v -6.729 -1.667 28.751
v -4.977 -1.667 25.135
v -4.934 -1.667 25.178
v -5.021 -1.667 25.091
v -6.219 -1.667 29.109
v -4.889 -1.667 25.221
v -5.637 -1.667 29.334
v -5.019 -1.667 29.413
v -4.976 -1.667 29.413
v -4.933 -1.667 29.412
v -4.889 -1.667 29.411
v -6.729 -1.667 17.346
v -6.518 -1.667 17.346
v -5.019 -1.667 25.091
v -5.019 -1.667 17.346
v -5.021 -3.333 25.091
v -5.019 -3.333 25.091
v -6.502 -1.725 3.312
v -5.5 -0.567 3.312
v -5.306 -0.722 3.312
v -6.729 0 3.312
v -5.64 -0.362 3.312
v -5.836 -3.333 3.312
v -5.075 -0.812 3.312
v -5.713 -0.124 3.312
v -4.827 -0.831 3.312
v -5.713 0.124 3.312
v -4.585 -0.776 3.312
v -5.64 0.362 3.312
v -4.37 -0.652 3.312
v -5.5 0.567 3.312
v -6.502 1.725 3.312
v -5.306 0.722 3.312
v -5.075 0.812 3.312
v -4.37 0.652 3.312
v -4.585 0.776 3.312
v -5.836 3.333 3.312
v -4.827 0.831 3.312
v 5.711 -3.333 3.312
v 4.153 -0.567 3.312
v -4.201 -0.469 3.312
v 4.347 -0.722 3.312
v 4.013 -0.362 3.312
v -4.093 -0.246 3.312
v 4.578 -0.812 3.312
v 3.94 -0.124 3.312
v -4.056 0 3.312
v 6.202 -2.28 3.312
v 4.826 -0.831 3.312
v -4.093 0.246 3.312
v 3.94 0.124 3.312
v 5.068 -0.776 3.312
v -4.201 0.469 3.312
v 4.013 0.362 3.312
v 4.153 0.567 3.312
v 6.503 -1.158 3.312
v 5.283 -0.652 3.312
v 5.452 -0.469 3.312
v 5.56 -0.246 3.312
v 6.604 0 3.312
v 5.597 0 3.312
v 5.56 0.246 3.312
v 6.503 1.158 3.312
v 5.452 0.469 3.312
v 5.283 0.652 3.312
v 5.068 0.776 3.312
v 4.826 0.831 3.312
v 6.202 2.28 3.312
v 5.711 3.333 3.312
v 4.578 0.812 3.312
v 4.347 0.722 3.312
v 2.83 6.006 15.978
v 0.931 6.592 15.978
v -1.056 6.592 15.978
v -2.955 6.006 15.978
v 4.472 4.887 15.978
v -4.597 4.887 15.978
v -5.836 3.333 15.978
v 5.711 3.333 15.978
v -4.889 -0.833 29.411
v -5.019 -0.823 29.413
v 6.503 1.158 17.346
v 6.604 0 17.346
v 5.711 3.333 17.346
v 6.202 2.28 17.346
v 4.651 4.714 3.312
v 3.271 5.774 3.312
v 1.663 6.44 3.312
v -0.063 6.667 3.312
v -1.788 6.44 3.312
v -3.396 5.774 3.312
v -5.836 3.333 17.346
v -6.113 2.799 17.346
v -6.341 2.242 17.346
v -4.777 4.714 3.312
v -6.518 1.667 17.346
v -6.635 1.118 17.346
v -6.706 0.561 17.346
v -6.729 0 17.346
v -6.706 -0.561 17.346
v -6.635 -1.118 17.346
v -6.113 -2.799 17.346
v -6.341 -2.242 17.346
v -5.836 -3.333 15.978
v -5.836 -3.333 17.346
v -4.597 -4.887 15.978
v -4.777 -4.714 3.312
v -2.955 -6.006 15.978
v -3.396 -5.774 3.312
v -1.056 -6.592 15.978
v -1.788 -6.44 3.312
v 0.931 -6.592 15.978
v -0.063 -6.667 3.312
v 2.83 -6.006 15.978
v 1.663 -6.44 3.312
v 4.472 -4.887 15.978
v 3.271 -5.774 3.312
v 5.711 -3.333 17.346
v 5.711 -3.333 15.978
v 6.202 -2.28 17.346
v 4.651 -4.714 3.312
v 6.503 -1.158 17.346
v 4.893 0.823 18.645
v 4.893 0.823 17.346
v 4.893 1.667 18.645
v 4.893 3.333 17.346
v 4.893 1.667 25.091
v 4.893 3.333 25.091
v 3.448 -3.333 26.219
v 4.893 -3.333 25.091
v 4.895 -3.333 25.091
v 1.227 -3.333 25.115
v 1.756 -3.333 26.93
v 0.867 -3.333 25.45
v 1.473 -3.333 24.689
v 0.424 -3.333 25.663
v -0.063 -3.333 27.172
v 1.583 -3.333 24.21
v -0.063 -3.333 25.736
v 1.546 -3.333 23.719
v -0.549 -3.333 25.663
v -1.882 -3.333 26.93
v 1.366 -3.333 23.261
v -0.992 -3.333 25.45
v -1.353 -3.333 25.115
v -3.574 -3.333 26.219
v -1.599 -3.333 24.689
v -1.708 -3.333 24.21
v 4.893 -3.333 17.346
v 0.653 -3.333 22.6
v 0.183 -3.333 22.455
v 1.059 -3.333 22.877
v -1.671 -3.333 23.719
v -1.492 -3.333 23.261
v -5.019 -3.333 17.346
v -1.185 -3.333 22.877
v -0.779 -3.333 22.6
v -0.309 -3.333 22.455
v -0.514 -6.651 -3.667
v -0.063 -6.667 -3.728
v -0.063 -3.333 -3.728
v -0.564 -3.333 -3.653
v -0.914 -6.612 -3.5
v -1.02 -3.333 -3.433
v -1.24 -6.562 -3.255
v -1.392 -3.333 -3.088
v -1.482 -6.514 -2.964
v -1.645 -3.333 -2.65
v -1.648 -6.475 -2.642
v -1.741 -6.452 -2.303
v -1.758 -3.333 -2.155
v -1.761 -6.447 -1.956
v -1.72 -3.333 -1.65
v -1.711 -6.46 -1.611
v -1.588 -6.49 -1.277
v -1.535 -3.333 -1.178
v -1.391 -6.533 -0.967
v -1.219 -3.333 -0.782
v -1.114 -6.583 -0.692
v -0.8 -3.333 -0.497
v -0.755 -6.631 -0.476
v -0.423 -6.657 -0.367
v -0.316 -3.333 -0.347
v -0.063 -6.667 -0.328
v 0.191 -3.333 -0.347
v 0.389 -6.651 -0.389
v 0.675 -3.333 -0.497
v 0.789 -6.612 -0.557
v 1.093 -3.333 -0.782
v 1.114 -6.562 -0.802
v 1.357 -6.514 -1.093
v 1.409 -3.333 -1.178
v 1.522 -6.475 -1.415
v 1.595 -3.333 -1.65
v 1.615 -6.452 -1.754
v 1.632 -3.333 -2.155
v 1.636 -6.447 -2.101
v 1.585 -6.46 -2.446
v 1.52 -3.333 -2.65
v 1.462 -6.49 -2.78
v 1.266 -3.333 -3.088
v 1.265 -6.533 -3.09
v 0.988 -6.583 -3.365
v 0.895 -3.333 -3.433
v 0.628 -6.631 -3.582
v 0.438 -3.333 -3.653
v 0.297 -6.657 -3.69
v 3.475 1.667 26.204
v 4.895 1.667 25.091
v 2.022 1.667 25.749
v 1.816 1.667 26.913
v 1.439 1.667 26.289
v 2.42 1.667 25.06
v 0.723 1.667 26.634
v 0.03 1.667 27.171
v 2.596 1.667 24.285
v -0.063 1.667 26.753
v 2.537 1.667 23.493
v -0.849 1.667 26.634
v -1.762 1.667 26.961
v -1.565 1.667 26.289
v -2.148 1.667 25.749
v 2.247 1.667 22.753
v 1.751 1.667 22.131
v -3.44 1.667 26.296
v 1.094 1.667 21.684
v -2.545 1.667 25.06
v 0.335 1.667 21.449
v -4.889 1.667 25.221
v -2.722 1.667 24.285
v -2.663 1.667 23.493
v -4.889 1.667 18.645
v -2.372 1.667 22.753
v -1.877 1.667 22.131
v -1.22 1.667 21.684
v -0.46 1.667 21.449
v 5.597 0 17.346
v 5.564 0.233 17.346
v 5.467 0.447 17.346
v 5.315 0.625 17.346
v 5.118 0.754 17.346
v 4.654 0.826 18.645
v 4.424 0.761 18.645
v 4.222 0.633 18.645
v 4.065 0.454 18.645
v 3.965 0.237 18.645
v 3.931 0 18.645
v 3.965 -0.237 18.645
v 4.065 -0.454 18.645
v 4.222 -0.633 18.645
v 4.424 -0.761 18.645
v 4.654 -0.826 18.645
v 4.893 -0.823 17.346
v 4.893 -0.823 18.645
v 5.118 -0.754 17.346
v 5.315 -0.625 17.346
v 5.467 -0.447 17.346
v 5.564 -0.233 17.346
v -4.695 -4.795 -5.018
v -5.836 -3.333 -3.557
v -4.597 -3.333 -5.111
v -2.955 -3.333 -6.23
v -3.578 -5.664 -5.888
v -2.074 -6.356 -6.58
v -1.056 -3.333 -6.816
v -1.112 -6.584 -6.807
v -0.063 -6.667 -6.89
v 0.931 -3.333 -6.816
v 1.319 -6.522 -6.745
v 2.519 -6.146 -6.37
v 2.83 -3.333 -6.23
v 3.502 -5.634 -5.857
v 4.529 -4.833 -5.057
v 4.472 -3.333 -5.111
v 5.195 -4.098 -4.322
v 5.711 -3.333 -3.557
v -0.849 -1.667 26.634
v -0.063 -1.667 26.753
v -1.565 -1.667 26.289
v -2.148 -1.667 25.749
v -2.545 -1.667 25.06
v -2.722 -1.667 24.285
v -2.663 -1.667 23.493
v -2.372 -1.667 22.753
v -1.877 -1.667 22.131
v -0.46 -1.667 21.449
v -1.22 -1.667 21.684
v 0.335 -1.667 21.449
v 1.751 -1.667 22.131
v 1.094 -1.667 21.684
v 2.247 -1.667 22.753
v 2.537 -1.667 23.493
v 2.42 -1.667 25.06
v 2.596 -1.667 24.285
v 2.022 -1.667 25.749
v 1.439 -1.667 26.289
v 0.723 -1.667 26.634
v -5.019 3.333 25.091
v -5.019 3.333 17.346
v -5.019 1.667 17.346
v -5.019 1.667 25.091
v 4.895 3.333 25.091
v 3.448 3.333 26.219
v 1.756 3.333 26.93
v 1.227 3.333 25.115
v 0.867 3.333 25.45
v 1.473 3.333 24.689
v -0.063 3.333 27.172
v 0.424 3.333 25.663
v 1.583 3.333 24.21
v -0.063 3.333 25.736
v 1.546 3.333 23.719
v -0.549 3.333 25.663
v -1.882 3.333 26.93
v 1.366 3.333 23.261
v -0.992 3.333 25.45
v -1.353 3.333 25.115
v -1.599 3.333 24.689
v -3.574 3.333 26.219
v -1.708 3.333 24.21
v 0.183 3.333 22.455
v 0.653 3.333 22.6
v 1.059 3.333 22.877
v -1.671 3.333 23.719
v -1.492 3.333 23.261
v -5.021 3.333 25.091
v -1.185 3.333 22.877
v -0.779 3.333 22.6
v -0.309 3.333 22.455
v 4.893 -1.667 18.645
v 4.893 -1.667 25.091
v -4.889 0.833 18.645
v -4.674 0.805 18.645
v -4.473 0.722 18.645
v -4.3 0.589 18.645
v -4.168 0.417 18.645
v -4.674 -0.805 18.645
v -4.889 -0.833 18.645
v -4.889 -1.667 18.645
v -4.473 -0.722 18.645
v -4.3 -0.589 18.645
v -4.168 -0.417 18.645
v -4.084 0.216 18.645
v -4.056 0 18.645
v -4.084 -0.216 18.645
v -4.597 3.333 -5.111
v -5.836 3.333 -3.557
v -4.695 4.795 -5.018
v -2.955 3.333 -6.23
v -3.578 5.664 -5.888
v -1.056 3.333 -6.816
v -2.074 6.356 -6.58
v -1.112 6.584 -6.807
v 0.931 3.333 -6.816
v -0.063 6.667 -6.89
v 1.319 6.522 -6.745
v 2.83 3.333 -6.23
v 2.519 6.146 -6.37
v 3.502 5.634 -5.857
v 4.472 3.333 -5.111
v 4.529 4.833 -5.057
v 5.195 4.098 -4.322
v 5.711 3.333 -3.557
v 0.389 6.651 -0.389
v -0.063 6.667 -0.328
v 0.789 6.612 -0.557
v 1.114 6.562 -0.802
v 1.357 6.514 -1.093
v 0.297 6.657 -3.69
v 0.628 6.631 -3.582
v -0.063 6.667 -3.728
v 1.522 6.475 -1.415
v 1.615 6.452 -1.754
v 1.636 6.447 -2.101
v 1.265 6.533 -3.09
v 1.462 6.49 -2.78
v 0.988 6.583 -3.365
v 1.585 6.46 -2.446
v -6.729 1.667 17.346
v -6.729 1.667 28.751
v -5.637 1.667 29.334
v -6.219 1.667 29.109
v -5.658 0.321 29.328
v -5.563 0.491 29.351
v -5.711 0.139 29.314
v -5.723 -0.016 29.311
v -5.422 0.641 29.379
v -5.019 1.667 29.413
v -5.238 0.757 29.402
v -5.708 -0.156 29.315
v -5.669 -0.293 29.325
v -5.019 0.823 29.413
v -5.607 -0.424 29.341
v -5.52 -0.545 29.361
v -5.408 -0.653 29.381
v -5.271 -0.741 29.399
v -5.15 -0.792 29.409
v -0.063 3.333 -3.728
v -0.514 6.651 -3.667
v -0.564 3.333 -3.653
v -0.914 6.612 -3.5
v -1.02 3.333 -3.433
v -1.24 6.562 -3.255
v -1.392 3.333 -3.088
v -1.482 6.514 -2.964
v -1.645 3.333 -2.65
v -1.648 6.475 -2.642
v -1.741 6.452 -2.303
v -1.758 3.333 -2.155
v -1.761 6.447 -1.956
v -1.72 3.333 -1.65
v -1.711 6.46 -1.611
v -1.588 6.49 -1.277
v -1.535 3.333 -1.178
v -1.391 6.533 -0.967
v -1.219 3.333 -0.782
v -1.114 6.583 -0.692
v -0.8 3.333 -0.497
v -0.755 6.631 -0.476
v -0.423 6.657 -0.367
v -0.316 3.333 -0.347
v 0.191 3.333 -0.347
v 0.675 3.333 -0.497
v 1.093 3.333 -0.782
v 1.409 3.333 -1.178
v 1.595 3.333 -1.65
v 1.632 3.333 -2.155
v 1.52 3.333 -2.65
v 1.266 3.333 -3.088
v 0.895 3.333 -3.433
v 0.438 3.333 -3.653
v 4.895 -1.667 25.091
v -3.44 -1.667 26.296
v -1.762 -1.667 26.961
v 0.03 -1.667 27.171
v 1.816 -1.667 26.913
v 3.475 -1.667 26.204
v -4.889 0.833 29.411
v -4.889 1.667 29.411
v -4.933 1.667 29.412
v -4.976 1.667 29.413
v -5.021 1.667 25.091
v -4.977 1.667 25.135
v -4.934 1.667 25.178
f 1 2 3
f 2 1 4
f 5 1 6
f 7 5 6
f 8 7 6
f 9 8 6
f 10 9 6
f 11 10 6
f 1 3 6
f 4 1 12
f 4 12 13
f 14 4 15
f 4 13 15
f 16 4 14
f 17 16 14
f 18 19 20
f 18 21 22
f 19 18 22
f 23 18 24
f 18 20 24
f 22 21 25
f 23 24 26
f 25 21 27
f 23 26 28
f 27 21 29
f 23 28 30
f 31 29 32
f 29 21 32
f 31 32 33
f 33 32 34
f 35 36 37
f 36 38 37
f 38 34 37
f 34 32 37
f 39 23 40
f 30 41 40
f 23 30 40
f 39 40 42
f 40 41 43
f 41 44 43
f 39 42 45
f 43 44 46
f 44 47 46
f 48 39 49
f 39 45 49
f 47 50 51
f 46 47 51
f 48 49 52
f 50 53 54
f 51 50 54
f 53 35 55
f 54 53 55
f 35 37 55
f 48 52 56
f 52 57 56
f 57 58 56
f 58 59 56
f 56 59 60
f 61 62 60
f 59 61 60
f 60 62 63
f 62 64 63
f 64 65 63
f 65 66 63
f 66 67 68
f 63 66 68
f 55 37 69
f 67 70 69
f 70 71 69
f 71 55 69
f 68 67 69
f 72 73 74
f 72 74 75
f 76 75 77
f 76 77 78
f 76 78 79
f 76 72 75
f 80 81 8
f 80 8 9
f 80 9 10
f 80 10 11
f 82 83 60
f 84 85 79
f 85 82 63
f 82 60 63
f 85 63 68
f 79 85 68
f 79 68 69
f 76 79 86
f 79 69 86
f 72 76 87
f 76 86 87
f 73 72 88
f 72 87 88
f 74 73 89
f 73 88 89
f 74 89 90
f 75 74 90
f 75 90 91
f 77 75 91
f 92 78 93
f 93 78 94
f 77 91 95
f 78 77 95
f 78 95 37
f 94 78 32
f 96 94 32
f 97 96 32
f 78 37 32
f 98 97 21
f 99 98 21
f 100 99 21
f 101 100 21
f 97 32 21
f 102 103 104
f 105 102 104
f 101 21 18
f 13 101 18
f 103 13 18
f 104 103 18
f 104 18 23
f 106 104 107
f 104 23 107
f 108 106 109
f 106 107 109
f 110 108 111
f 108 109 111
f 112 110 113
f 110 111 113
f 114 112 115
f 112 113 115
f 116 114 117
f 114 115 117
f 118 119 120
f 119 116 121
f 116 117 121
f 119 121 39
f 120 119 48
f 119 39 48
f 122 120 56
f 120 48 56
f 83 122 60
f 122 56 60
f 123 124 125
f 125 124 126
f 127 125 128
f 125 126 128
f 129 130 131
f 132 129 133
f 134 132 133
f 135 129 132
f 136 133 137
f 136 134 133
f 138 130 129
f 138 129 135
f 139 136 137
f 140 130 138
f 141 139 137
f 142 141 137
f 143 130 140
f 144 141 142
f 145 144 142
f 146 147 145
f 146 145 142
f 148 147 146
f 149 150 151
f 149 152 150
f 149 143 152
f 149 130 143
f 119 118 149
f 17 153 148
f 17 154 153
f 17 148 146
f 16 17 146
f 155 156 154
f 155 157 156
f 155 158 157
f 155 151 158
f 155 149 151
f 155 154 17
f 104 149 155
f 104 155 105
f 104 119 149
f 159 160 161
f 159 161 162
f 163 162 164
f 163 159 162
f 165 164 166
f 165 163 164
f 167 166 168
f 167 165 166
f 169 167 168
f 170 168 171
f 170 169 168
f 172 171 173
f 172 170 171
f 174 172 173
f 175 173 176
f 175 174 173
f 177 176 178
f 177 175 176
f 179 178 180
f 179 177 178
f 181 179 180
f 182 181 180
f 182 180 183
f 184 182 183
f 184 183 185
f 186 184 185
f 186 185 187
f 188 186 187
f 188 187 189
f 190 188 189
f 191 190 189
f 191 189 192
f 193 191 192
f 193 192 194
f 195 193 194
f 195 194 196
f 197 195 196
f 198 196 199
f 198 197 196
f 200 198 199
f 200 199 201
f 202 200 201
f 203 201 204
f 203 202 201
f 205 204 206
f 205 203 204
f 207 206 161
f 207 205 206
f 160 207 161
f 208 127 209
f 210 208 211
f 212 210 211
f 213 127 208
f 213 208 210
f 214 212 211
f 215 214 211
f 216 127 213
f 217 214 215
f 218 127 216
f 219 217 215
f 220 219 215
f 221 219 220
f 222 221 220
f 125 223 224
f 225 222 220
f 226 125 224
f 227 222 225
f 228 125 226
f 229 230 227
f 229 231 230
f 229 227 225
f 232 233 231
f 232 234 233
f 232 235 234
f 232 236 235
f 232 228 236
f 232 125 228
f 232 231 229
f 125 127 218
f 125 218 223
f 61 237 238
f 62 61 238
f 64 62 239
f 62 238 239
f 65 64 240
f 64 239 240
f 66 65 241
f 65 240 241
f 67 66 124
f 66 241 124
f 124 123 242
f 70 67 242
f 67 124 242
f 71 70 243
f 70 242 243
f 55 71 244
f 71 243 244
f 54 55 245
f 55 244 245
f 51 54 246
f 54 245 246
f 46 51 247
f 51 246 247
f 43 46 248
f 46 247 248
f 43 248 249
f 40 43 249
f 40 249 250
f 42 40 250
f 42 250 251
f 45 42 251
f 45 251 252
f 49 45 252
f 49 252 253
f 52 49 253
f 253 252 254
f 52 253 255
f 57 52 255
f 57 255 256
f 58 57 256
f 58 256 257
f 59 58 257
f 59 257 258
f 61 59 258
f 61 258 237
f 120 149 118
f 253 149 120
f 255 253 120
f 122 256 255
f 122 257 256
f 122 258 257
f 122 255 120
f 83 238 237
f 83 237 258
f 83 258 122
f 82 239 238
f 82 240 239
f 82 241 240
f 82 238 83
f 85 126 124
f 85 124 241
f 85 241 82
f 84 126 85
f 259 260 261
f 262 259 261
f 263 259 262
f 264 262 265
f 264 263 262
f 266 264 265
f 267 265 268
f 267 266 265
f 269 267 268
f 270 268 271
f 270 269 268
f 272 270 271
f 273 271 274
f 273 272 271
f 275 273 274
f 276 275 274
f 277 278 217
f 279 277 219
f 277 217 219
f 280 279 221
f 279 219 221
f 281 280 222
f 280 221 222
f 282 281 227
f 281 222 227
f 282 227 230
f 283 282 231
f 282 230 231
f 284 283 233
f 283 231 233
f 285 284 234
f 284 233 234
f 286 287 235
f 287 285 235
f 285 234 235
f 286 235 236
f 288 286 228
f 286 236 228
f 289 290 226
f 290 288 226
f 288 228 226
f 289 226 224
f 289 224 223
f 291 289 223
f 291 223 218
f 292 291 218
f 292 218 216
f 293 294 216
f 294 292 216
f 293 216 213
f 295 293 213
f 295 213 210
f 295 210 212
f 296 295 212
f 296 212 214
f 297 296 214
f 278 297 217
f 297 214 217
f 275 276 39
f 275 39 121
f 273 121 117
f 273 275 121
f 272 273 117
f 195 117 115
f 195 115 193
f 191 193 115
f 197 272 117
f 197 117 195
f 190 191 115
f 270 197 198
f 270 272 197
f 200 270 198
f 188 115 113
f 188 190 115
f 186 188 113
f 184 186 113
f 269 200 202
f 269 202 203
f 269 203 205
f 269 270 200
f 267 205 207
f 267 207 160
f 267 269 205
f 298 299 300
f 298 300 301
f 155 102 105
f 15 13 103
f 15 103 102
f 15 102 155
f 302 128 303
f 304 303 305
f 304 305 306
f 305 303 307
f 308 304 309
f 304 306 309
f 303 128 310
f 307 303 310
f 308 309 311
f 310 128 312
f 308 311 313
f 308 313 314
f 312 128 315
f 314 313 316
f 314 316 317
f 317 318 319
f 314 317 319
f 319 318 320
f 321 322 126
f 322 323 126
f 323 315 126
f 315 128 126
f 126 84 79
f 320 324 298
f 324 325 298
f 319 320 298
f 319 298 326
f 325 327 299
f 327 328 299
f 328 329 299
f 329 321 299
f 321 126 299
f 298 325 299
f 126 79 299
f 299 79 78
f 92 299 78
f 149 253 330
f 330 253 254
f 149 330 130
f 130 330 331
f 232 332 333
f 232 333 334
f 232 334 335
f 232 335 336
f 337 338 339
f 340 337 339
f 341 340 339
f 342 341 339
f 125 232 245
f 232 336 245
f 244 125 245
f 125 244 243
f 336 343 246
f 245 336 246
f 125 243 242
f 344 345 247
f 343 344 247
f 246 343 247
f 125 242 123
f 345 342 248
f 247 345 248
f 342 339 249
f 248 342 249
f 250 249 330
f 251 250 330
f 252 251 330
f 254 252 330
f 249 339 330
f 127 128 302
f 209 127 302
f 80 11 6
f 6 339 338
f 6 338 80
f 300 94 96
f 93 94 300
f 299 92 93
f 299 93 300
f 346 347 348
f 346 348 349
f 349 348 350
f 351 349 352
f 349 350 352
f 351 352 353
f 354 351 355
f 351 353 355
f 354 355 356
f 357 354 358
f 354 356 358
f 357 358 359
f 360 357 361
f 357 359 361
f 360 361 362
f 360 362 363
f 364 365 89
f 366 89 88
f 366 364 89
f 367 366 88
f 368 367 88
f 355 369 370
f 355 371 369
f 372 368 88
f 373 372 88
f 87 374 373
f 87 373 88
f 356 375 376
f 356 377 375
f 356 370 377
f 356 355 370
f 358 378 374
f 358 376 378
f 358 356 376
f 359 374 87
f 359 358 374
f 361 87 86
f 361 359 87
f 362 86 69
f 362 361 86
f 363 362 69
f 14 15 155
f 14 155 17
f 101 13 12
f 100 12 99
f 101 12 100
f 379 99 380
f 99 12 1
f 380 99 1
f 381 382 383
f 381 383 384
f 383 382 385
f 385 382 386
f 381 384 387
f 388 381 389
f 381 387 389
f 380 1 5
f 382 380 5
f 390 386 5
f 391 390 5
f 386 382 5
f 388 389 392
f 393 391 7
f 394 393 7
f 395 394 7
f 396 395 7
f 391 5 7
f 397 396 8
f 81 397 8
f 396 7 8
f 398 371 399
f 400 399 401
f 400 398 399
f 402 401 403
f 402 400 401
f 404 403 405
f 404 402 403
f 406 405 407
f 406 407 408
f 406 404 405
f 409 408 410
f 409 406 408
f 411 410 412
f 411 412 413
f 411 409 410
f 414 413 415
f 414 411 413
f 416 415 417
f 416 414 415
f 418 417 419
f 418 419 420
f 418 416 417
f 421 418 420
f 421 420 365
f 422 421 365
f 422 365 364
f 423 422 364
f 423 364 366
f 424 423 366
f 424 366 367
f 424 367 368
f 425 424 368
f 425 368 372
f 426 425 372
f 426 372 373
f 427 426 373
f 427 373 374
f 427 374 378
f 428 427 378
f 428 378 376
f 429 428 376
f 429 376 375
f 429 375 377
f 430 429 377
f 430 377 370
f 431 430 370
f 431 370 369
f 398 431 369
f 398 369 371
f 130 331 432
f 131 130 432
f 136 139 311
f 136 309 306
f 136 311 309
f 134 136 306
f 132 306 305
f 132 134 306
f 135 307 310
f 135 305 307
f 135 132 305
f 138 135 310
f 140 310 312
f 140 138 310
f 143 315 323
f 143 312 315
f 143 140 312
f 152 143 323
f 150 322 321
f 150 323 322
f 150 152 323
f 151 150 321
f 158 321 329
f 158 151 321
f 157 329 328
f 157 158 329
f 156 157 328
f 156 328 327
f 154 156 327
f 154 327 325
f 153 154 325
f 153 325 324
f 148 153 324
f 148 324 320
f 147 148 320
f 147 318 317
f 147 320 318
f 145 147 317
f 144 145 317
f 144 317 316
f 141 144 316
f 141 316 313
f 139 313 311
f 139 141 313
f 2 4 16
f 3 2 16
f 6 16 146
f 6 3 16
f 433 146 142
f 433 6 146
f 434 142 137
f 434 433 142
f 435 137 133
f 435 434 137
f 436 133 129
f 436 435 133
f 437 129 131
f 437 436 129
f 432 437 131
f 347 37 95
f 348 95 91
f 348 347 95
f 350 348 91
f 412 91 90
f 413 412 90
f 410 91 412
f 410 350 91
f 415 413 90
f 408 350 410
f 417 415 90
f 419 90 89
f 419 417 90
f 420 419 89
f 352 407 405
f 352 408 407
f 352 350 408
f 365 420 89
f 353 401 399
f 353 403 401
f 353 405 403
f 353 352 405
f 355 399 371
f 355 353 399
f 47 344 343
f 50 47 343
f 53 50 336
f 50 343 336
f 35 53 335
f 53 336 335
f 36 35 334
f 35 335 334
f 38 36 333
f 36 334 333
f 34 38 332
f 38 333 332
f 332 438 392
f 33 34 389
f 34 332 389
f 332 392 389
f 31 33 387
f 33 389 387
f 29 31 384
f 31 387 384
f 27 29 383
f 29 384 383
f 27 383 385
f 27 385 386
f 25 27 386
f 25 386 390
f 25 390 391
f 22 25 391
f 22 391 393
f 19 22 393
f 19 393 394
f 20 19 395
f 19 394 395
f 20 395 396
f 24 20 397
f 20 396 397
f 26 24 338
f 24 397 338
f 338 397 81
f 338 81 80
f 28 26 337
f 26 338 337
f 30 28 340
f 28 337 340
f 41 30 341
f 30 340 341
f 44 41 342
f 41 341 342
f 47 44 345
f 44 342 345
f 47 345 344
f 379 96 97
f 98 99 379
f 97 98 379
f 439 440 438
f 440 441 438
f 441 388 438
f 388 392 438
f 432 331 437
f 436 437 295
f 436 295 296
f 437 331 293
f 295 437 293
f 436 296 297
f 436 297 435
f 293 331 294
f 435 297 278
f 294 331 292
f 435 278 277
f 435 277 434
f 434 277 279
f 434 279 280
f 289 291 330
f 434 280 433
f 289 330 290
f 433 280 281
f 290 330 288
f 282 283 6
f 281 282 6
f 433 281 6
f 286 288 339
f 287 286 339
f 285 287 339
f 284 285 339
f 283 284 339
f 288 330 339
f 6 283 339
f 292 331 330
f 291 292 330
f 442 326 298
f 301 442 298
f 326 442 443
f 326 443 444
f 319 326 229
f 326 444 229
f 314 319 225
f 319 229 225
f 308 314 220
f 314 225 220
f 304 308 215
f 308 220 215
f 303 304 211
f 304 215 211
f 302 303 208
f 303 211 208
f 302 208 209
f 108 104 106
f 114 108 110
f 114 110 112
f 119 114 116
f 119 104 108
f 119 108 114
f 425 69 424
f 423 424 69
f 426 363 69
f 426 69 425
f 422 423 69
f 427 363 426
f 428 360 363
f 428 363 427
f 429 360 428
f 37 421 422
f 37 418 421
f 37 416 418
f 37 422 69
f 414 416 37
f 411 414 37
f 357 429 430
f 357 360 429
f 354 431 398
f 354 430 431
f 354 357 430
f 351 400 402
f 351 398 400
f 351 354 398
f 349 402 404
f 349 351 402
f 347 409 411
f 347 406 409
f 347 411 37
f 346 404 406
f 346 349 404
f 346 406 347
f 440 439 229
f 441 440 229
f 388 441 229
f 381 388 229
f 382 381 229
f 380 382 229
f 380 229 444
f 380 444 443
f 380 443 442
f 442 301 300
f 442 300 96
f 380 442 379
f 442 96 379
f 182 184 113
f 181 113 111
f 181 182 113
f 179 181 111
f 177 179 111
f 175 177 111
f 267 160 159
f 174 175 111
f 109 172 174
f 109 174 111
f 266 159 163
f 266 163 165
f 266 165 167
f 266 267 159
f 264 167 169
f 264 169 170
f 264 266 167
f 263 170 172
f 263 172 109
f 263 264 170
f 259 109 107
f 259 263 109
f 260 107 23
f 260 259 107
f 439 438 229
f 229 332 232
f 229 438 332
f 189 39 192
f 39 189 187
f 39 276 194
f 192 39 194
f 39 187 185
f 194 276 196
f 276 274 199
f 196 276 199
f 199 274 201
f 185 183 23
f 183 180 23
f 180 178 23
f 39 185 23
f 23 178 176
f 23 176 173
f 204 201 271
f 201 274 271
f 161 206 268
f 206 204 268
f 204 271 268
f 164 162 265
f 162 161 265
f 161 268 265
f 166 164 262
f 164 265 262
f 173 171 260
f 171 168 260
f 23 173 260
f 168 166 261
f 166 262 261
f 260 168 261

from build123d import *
from build123d.topology import SkipClean

# Parameters (mm, degrees)
SKETCH2_R                       = 10
PHALANGE_LENGTH_DEPTH           = 23
BOSS_EXTRUDE3_DEPTH             = 5
BOSS_EXTRUDE4_DEPTH             = 5
BOSS_EXTRUDE4_DEPTH_BACK        = 5
CUT_EXTRUDE2_START              = -15.3025
CUT_EXTRUDE2_DEPTH              = 15.3025
SKETCH7_R                       = 1.65
CUT_EXTRUDE3_DEPTH              = 10
CUT_EXTRUDE4_DEPTH              = 2.5
CUT_EXTRUDE4_DEPTH_BACK         = 2.5
CUT_EXTRUDE7_REACH              = 44.378
SKETCH4_R                       = 1.65
CUT_EXTRUDE7_DIRECTION_2_REACH  = 44.378
CUT_EXTRUDE_THIN1_START         = 23
CUT_EXTRUDE_THIN1_DEPTH         = 10.361670454
BOSS_EXTRUDE5_REACH             = 43.559
SKETCH9_R                       = 4
SKETCH9_R_2                     = 1.65
CUT_EXTRUDE8_REACH              = 42.83
SKETCH10_R                      = 1.25
CUT_EXTRUDE9_START              = -4
CUT_EXTRUDE9_DEPTH              = 4
CUT_EXTRUDE10_REACH             = 43.559
CUT_EXTRUDE10_DIRECTION_2_REACH = 43.559
CUT_EXTRUDE11_START             = -10
CUT_EXTRUDE11_OUTLINE_W         = 2.565773848
CUT_EXTRUDE11_OUTLINE_H         = 11.6166929
CUT_EXTRUDE11_DEPTH             = 10
BOSS_EXTRUDE7_REACH             = 41.207
CUT_EXTRUDE12_REACH             = 42.83
SKETCH10_2_R                    = 1.25
CUT_EXTRUDE12_DIRECTION_2_REACH = 42.83
SKETCH17_R                      = 1.25
SKETCH17_W                      = 2.42123439
SKETCH17_H                      = 5
CUT_EXTRUDE14_DEPTH             = 16.148519
SCALE1_SCALE                    = 0.666666667
CUT_EXTRUDE15_START             = -10
SKETCH18_R                      = 1.65
CUT_EXTRUDE15_DEPTH             = 13.333338
CUT_EXTRUDE16_START             = -3.333333
SKETCH19_R                      = 1.7
CUT_EXTRUDE16_DEPTH             = 13.333338


# Read off the part's stored shape, not the designer's step: Cut-Extrude-Thin1, Cut-Extrude11
with BuildPart() as part:
    # Sketch2 → Phalange Length (new body)
    with BuildSketch(Plane.XY):
        Circle(SKETCH2_R)
    extrude(amount=PHALANGE_LENGTH_DEPTH)

    # Sketch3 → Boss-Extrude3 (add)
    with BuildSketch(Plane(origin=(0, -10, 0), x_dir=(-1, 0, 0), z_dir=(0, -1, 0))):
        with BuildLine():
            Line((-10, 5.302499701), (-10, 0))
            Line((-10, 0), (10, 0))
            Line((10, 0), (10, 5.302499701))
            ThreePointArc((10, 5.302499701), (0, 15.302499701), (-10, 5.302499701))
        make_face()
    boss_extrude3 = extrude(amount=-BOSS_EXTRUDE3_DEPTH)

    # Mirror1: Boss-Extrude3 across plane
    add(boss_extrude3.mirror(Plane.ZX))

    # Sketch5 → Boss-Extrude4 (add, two sides: drawn at the far end of the back side and taken through both)
    with BuildSketch(Plane(origin=(0, 0, 0), x_dir=(1, 0, 0), z_dir=(0, 1, 0)).offset(-BOSS_EXTRUDE4_DEPTH_BACK)):
        with BuildLine():
            Line((-10, -28.783157911), (-10, -23))
            Line((-10, -23), (10, -23))
            Line((10, -23), (10, -28.783157911))
            ThreePointArc((10, -28.783157911), (0, -38.351984156), (-10, -28.783157911))
        make_face()
    extrude(amount=BOSS_EXTRUDE4_DEPTH + BOSS_EXTRUDE4_DEPTH_BACK)

    # Sketch6 → Cut-Extrude2 (cut)
    with SkipClean():  # the faces are left unmerged after this step: merging them gives an invalid solid
        with BuildSketch(Plane.XY.offset(CUT_EXTRUDE2_START)):
            with BuildLine():
                ThreePointArc((0, 10), (5, 8.660254038), (8.660254038, 5))
                Line((8.660254038, 5), (10, 5))
                Line((10, 5), (10, 10))
                Line((10, 10), (0, 10))
            make_face()
            with BuildLine():
                Line((10, -5), (8.660254038, -5))
                ThreePointArc((8.660254038, -5), (5, -8.660254038), (0, -10))
                Line((0, -10), (10, -10))
                Line((10, -10), (10, -5))
            make_face()
            with BuildLine():
                ThreePointArc((-8.660254038, 5), (-5, 8.660254038), (0, 10))
                Line((0, 10), (-10, 10))
                Line((-10, 10), (-10, 5))
                Line((-10, 5), (-8.660254038, 5))
            make_face()
            with BuildLine():
                Line((-10, -10), (0, -10))
                ThreePointArc((0, -10), (-5, -8.660254038), (-8.660254038, -5))
                Line((-8.660254038, -5), (-10, -5))
                Line((-10, -5), (-10, -10))
            make_face()
        extrude(amount=CUT_EXTRUDE2_DEPTH, mode=Mode.SUBTRACT)

    # Sketch7 → Cut-Extrude3 (cut)
    with SkipClean():  # the faces are left unmerged after this step: merging them gives an invalid solid
        with BuildSketch(Plane(origin=(0, 5, 0), x_dir=(1, 0, 0), z_dir=(0, 1, 0))):
            with Locations(Location((0, -31.161984156, 0), (0, 0, 270))):
                Circle(SKETCH7_R)
        extrude(amount=-CUT_EXTRUDE3_DEPTH, mode=Mode.SUBTRACT)

    # Sketch5<2> → Cut-Extrude4 (cut, two sides: drawn at the far end of the back side and taken through both)
    with BuildSketch(Plane(origin=(0, 0, 0), x_dir=(1, 0, 0), z_dir=(0, 1, 0)).offset(-CUT_EXTRUDE4_DEPTH_BACK)):
        with BuildLine():
            Line((-10, -28.783157911), (-10, -23))
            Line((-10, -23), (10, -23))
            Line((10, -23), (10, -28.783157911))
            ThreePointArc((10, -28.783157911), (0, -38.351984156), (-10, -28.783157911))
        make_face()
    extrude(amount=CUT_EXTRUDE4_DEPTH + CUT_EXTRUDE4_DEPTH_BACK, mode=Mode.SUBTRACT)

    # Sketch4 → Cut-Extrude7 (cut, up to next)
    with BuildSketch(Plane(origin=(0, -5, 0), x_dir=(1, 0, 0), z_dir=(0, 1, 0)), mode=Mode.PRIVATE) as cut_extrude7_sk1:
        with Locations(Location((0, 8.010159673, 0), (0, 0, 270))):
            Circle(SKETCH4_R)
    cut_extrude7_tool1 = extrude(cut_extrude7_sk1.sketch, amount=-CUT_EXTRUDE7_REACH, mode=Mode.PRIVATE) & part.part
    add(cut_extrude7_tool1.solids().sort_by_distance((0, -5, -8.01016))[0], mode=Mode.SUBTRACT)

    # Sketch4 → Cut-Extrude7 direction 2 (cut, up to next)
    with BuildSketch(Plane(origin=(0, -5, 0), x_dir=(1, 0, 0), z_dir=(0, 1, 0)), mode=Mode.PRIVATE) as cut_extrude7_direction_2_sk1:
        with Locations(Location((0, 8.010159673, 0), (0, 0, 270))):
            Circle(SKETCH4_R)
    cut_extrude7_direction_2_tool1 = extrude(cut_extrude7_direction_2_sk1.sketch, amount=CUT_EXTRUDE7_DIRECTION_2_REACH, mode=Mode.PRIVATE) & part.part
    add(cut_extrude7_direction_2_tool1.solids().sort_by_distance((0, -5, -8.01016))[0], mode=Mode.SUBTRACT)

    # Cut-Extrude-Thin1 outline → Cut-Extrude-Thin1 (cut)
    with SkipClean():  # the faces are left unmerged after this step: merging them gives an invalid solid
        with BuildSketch(Plane.XY.offset(CUT_EXTRUDE_THIN1_START)):
            with BuildLine():
                ThreePointArc((8.660254038, 5), (9.256147934, 3.78466979), (9.682458366, 2.5))
                Line((9.682458366, 2.5), (10, 2.5))
                Line((10, 2.5), (10, 5))
                Line((10, 5), (8.660254038, 5))
            make_face()
            with BuildLine():
                Line((10, -2.5), (9.682458366, -2.5))
                ThreePointArc((9.682458366, -2.5), (9.256147934, -3.78466979), (8.660254038, -5))
                Line((8.660254038, -5), (10, -5))
                Line((10, -5), (10, -2.5))
            make_face()
            with BuildLine():
                Line((-10, 2.5), (-9.682458366, 2.5))
                ThreePointArc((-9.682458366, 2.5), (-9.256147934, 3.78466979), (-8.660254038, 5))
                Line((-8.660254038, 5), (-10, 5))
                Line((-10, 5), (-10, 2.5))
            make_face()
            with BuildLine():
                ThreePointArc((-8.660254038, -5), (-9.256147934, -3.78466979), (-9.682458366, -2.5))
                Line((-9.682458366, -2.5), (-10, -2.5))
                Line((-10, -2.5), (-10, -5))
                Line((-10, -5), (-8.660254038, -5))
            make_face()
        extrude(amount=CUT_EXTRUDE_THIN1_DEPTH, mode=Mode.SUBTRACT)

    # Sketch9 → Boss-Extrude5 (add, up to next)
    with BuildSketch(Plane.XZ.offset(-2.5), mode=Mode.PRIVATE) as boss_extrude5_sk1:
        with Locations(Location((0, 31.161984156, 0), (0, 0, 90))):
            Circle(SKETCH9_R)
        with Locations(Location((0, 31.161984156, 0), (0, 0, 90))):
            Circle(SKETCH9_R_2, mode=Mode.SUBTRACT)
    boss_extrude5_tool1 = extrude(boss_extrude5_sk1.sketch, amount=BOSS_EXTRUDE5_REACH, mode=Mode.PRIVATE) - part.part
    add(boss_extrude5_tool1.solids().sort_by_distance((0, 2.5, 27.275121))[0])

    # Sketch10 → Cut-Extrude8 (cut, up to next)
    with BuildSketch(Plane.XY.offset(23), mode=Mode.PRIVATE) as cut_extrude8_sk1:
        with Locations((7.239961745, 0)):
            Circle(SKETCH10_R)
    cut_extrude8_tool1 = extrude(cut_extrude8_sk1.sketch, amount=-CUT_EXTRUDE8_REACH, mode=Mode.PRIVATE) & part.part
    # Sketch10 → Cut-Extrude8 (cut, up to next)
    with BuildSketch(Plane.XY.offset(23), mode=Mode.PRIVATE) as cut_extrude8_sk2:
        with Locations((-7.239961745, 0)):
            Circle(SKETCH10_R)
    cut_extrude8_tool2 = extrude(cut_extrude8_sk2.sketch, amount=-CUT_EXTRUDE8_REACH, mode=Mode.PRIVATE) & part.part
    add(cut_extrude8_tool1.solids().sort_by_distance((7.239962, 0, 23))[0], mode=Mode.SUBTRACT)
    add(cut_extrude8_tool2.solids().sort_by_distance((-7.239962, 0, 23))[0], mode=Mode.SUBTRACT)

    # Sketch11 → Cut-Extrude9 (cut)
    with SkipClean():  # the faces are left unmerged after this step: merging them gives an invalid solid
        with BuildSketch(Plane.XY.offset(23).offset(CUT_EXTRUDE9_START)):
            with BuildLine():
                ThreePointArc((8.660254038, 5), (0, 10), (-8.660254038, 5))
                Line((-8.660254038, 5), (8.660254038, 5))
            make_face()
            with BuildLine():
                Line((8.660254038, -5), (-8.660254038, -5))
                ThreePointArc((-8.660254038, -5), (0, -10), (8.660254038, -5))
            make_face()
        extrude(amount=CUT_EXTRUDE9_DEPTH, mode=Mode.SUBTRACT)

    # Sketch12 → Cut-Extrude10 (cut, up to next)
    with BuildSketch(Plane.XZ.offset(-2.5), mode=Mode.PRIVATE) as cut_extrude10_sk1:
        with BuildLine():
            Line((-10.033719202, 38.351984156), (-10.033719202, 31.164892021))
            Line((-10.033719202, 31.164892021), (-8.660254038, 31.164892021))
            ThreePointArc((-8.660254038, 31.164892021), (0, 35.790740593), (8.660254038, 31.164892021))
            Line((8.660254038, 31.164892021), (10.033719202, 31.164892021))
            Line((10.033719202, 31.164892021), (10.033719202, 38.351984156))
            Line((10.033719202, 38.351984156), (-10.033719202, 38.351984156))
        make_face()
    cut_extrude10_tool1 = extrude(cut_extrude10_sk1.sketch, amount=CUT_EXTRUDE10_REACH, mode=Mode.PRIVATE) & part.part
    add(cut_extrude10_tool1.solids().sort_by_distance((0, 2.5, 35.850279))[0], mode=Mode.SUBTRACT)

    # Sketch12 → Cut-Extrude10 direction 2 (cut, up to next)
    with BuildSketch(Plane.XZ.offset(-2.5), mode=Mode.PRIVATE) as cut_extrude10_direction_2_sk1:
        with BuildLine():
            Line((-10.033719202, 38.351984156), (-10.033719202, 31.164892021))
            Line((-10.033719202, 31.164892021), (-8.660254038, 31.164892021))
            ThreePointArc((-8.660254038, 31.164892021), (0, 35.790740593), (8.660254038, 31.164892021))
            Line((8.660254038, 31.164892021), (10.033719202, 31.164892021))
            Line((10.033719202, 31.164892021), (10.033719202, 38.351984156))
            Line((10.033719202, 38.351984156), (-10.033719202, 38.351984156))
        make_face()
    cut_extrude10_direction_2_tool1 = extrude(cut_extrude10_direction_2_sk1.sketch, amount=-CUT_EXTRUDE10_DIRECTION_2_REACH, mode=Mode.PRIVATE) & part.part
    add(cut_extrude10_direction_2_tool1.solids().sort_by_distance((0, 2.5, 35.850279))[0], mode=Mode.SUBTRACT)

    # Cut-Extrude11 outline → Cut-Extrude11 (cut)
    with BuildSketch(Plane.XZ.offset(5).offset(CUT_EXTRUDE11_START)):
        with Locations((-8.717113076, 26.860571369)):
            Rectangle(CUT_EXTRUDE11_OUTLINE_W, CUT_EXTRUDE11_OUTLINE_H)
        with Locations((8.717113076, 26.860571369)):
            Rectangle(CUT_EXTRUDE11_OUTLINE_W, CUT_EXTRUDE11_OUTLINE_H)
    extrude(amount=CUT_EXTRUDE11_DEPTH, mode=Mode.SUBTRACT)

    # Boss-Extrude7: up to this face of the body (flat: up to its plane)
    boss_extrude7_end = Plane(part.part.faces().sort_by_distance((0, 2.5, 23.196174341))[0])
    # Sketch16 → Boss-Extrude7 (add, up to the picked face)
    with BuildSketch(Plane(origin=(0, -2.5, 0), x_dir=(1, 0, 0), z_dir=(0, 1, 0)), mode=Mode.PRIVATE) as boss_extrude7_sk1:
        with BuildLine():
            Line((-4.818727355, -21.052224919), (-7.434226152, -21.052224919))
            Line((-7.434226152, -21.052224919), (-10, -21.052224919))
            Line((-10, -21.052224919), (-10, -38.158561033))
            ThreePointArc((-10, -38.158561033), (-8.808295471, -38.890817912), (-7.43422564, -39.152145139))
            ThreePointArc((-7.43422564, -39.152145139), (-6.033645007, -38.899721533), (-4.818727355, -38.158561033))
            Line((-4.818727355, -38.158561033), (-4.818727355, -34.609527951))
            ThreePointArc((-4.818727355, -34.609527951), (-6.204248493, -33.742230104), (-7.437080645, -32.668917819))
            Line((-7.437080645, -32.668917819), (-7.434226152, -32.668917819))
            Line((-7.434226152, -32.668917819), (-7.434226152, -23))
            Line((-7.434226152, -23), (-4.818727355, -23))
            Line((-4.818727355, -23), (-4.818727355, -21.052224919))
        make_face()
    boss_extrude7_tool1 = split(extrude(boss_extrude7_sk1.sketch, amount=BOSS_EXTRUDE7_REACH, mode=Mode.PRIVATE), bisect_by=boss_extrude7_end, keep=Keep.BOTH, mode=Mode.PRIVATE)
    # Sketch16 → Boss-Extrude7 (add, up to the picked face)
    with BuildSketch(Plane(origin=(0, -2.5, 0), x_dir=(1, 0, 0), z_dir=(0, 1, 0)), mode=Mode.PRIVATE) as boss_extrude7_sk2:
        with BuildLine():
            Line((-4.818727355, -34.609527951), (-4.818727355, -23))
            Line((-4.818727355, -23), (-7.434226152, -23))
            Line((-7.434226152, -23), (-7.434226152, -32.668917819))
            Line((-7.434226152, -32.668917819), (-7.437080645, -32.668917819))
            ThreePointArc((-7.437080645, -32.668917819), (-6.204248493, -33.742230104), (-4.818727355, -34.609527951))
        make_face()
    boss_extrude7_tool2 = split(extrude(boss_extrude7_sk2.sketch, amount=BOSS_EXTRUDE7_REACH, mode=Mode.PRIVATE), bisect_by=boss_extrude7_end, keep=Keep.BOTH, mode=Mode.PRIVATE)
    add(boss_extrude7_tool1.solids().sort_by(Axis((-7.989429, -2.5, 30.633344), (0, 1, 0)))[0])
    add(boss_extrude7_tool2.solids().sort_by(Axis((-6.08748, -2.5, 28.3879), (0, 1, 0)))[0])

    # Sketch10<2> → Cut-Extrude12 (cut, up to next)
    with BuildSketch(Plane.XY.offset(23), mode=Mode.PRIVATE) as cut_extrude12_sk1:
        with Locations((-7.239961745, 0)):
            Circle(SKETCH10_2_R)
    cut_extrude12_tool1 = extrude(cut_extrude12_sk1.sketch, amount=CUT_EXTRUDE12_REACH, mode=Mode.PRIVATE) & part.part
    add(cut_extrude12_tool1.solids().sort_by_distance((-7.239962, 0, 23))[0], mode=Mode.SUBTRACT)

    # Sketch10<2> → Cut-Extrude12 direction 2 (cut, up to next)
    with BuildSketch(Plane.XY.offset(23), mode=Mode.PRIVATE) as cut_extrude12_direction_2_sk1:
        with Locations((-7.239961745, 0)):
            Circle(SKETCH10_2_R)
    cut_extrude12_direction_2_tool1 = extrude(cut_extrude12_direction_2_sk1.sketch, amount=-CUT_EXTRUDE12_DIRECTION_2_REACH, mode=Mode.PRIVATE) & part.part
    add(cut_extrude12_direction_2_tool1.solids().sort_by_distance((-7.239962, 0, 23))[0], mode=Mode.SUBTRACT)

    # Sketch17 → Cut-Extrude14 (cut)
    with SkipClean():  # the faces are left unmerged after this step: merging them gives an invalid solid
        with BuildSketch(Plane.XY.offset(23)):
            with Locations((-7.239961745, 0)):
                Circle(SKETCH17_R)
            with Locations((-6.02934455, 0)):
                Rectangle(SKETCH17_W, SKETCH17_H)
        extrude(amount=CUT_EXTRUDE14_DEPTH, mode=Mode.SUBTRACT)


with BuildPart() as part_1:
    # Scale1: scaled about (-0.18837751, -1.72e-07, 9.934517088)
    add(part.part.scale(SCALE1_SCALE).moved(Location((-0.062792503, -5.7e-08, 3.311505696))))

    # Sketch18 → Cut-Extrude15 (cut)
    with BuildSketch(Plane(origin=(0, 3.3333287, 0), x_dir=(1, 0, 0), z_dir=(0, 1, 0)).offset(CUT_EXTRUDE15_START)):
        with Locations(Location((-0.062801677, -24.086327732, 0), (0, 0, 270))):
            Circle(SKETCH18_R)
    extrude(amount=CUT_EXTRUDE15_DEPTH, mode=Mode.SUBTRACT)

    # Sketch19 → Cut-Extrude16 (cut)
    with BuildSketch(Plane(origin=(0, -3.333337967, 0), x_dir=(1, 0, 0), z_dir=(0, 1, 0)).offset(CUT_EXTRUDE16_START)):
        with Locations(Location((-0.062801677, 2.02843482, 0), (0, 0, 90))):
            Circle(SKETCH19_R)
    extrude(amount=CUT_EXTRUDE16_DEPTH, mode=Mode.SUBTRACT)


solid = part_1.part
